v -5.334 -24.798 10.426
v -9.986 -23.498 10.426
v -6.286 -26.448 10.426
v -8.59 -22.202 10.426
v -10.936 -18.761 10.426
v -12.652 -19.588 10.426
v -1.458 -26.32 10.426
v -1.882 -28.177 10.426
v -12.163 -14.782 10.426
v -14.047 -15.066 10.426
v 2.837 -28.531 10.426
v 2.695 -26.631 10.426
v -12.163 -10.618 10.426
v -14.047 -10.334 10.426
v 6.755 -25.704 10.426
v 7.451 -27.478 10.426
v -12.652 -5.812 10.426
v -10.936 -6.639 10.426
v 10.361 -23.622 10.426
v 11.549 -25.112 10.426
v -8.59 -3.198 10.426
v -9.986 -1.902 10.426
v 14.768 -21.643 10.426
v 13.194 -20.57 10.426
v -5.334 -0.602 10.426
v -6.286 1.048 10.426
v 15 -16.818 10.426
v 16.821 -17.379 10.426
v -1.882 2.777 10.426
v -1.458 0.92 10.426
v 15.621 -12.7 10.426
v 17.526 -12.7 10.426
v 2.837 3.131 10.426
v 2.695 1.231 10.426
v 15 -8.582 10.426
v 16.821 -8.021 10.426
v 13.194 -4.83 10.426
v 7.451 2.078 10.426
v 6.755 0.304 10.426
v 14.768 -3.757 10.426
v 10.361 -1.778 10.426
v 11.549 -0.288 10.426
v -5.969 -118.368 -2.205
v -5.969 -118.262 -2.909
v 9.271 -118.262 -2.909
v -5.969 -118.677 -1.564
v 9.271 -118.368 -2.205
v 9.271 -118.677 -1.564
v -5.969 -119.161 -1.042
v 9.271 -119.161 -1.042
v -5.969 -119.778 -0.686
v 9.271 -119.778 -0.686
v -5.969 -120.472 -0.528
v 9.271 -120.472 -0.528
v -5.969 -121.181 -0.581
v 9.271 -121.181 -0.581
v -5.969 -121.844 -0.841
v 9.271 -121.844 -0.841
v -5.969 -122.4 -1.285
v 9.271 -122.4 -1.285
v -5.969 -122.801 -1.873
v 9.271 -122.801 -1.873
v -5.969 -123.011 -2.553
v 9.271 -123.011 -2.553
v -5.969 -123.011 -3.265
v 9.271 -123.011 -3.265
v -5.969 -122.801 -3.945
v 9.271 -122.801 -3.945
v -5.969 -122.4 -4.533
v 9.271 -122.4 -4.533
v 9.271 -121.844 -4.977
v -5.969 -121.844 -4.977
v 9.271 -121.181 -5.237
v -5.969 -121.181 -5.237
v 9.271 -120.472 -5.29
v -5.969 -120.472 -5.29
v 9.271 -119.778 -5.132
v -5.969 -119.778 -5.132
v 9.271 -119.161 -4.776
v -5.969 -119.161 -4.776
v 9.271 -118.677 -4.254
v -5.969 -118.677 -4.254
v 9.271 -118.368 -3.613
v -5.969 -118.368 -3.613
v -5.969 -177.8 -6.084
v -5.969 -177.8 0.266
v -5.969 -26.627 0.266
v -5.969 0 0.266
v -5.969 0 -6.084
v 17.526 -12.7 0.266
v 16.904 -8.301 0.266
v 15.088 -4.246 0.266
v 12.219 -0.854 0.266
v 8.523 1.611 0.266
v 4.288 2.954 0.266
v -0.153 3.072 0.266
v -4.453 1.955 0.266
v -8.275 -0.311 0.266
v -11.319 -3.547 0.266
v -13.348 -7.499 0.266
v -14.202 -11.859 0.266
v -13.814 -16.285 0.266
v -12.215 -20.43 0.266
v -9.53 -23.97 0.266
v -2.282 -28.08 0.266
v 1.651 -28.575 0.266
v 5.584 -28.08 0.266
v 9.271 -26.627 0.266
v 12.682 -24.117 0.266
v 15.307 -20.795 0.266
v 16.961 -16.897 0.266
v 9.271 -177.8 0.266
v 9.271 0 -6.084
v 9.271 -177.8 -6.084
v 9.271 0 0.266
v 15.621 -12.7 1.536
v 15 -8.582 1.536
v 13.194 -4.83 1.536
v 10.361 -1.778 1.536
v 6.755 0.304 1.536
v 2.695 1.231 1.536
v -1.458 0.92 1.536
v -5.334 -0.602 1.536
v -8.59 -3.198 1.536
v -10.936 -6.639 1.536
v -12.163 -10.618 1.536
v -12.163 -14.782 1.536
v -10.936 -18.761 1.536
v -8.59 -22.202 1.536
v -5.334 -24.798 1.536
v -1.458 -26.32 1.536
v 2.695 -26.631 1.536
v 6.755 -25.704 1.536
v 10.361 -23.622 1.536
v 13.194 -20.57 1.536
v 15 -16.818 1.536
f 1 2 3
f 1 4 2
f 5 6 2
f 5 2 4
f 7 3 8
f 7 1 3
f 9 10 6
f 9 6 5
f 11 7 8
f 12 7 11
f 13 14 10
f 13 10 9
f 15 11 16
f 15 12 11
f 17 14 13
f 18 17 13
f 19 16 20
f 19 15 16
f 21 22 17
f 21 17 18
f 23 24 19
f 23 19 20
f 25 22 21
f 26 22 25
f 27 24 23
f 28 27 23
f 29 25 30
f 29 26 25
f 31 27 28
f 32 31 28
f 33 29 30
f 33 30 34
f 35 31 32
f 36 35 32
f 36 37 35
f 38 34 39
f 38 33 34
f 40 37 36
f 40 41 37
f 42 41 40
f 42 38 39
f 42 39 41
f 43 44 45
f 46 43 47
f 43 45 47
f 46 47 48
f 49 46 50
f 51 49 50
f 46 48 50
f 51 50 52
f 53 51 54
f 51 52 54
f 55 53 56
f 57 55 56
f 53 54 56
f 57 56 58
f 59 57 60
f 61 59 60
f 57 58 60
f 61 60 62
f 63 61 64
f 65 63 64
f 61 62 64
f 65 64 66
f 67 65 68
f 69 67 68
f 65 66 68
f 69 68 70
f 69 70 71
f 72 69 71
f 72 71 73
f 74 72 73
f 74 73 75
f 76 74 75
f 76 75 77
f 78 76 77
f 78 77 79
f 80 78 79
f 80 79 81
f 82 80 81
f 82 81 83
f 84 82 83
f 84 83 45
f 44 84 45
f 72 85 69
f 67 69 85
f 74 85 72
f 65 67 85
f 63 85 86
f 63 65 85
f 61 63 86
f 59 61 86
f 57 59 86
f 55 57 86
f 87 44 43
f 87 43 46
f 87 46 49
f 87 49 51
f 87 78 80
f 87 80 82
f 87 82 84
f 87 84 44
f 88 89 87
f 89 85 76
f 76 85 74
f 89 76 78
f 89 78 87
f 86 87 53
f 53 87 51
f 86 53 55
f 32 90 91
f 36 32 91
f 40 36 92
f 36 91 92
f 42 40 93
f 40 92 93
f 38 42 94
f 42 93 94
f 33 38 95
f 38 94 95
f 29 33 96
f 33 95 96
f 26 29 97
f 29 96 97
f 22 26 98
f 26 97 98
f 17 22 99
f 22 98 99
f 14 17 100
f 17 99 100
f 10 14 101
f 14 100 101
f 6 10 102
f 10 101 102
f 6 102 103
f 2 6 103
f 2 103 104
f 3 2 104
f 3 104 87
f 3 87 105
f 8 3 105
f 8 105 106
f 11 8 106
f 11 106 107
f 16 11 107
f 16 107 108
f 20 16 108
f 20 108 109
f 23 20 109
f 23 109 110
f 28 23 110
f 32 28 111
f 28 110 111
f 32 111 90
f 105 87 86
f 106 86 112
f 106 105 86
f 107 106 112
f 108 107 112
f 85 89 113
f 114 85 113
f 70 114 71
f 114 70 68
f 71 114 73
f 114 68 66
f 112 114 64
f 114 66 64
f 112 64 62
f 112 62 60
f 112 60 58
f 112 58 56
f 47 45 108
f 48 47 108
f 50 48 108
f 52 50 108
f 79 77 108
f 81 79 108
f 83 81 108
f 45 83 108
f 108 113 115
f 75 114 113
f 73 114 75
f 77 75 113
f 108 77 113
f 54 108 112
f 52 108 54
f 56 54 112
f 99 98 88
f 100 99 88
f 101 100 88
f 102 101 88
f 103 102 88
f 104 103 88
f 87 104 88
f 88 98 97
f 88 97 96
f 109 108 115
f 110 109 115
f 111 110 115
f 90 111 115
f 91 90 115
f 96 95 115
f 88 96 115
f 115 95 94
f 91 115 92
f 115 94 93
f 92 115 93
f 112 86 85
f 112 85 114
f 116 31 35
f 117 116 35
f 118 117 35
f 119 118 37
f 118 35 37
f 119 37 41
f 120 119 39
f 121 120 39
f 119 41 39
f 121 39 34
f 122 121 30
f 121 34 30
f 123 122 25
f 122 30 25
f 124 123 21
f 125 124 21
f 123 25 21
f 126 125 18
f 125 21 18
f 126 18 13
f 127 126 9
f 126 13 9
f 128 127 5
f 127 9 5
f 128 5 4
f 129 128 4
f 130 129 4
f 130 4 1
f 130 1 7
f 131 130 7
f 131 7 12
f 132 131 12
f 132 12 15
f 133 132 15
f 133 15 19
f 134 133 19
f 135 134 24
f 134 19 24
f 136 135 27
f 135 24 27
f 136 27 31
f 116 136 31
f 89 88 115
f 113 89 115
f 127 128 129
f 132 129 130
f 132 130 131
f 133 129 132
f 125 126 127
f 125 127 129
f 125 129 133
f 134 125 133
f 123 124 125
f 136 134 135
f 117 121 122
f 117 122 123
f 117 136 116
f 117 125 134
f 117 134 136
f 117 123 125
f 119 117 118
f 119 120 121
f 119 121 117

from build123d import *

# Parameters (mm, degrees)
F0_W     = 15.24
F0_H     = 6.35
F1_DEPTH = 177.8
F2_R     = 2.3876
F3_DEPTH = 15.241
F4_R     = 15.875
F5_DEPTH = 10.16
F6_R     = 13.97
F7_DEPTH = 8.89


with BuildPart() as f1:
    # F0 (on Front) → F1 (new body)
    with BuildSketch(Plane.XZ):
        with Locations((1.651002, -2.908992)):
            Rectangle(F0_W, F0_H)
    extrude(amount=F1_DEPTH)

    # F2 (on face) → F3 (cut, through all)
    with BuildSketch(Plane.YZ.offset(9.271002)):
        with Locations((-120.65, -2.908992)):
            Circle(F2_R)
    extrude(amount=-F3_DEPTH, mode=Mode.SUBTRACT)

    # F4 (on face) → F5 (join)
    with BuildSketch(Plane.XY.offset(0.266008)):
        with Locations((1.651002, -12.7)):
            Circle(F4_R)
    extrude(amount=F5_DEPTH)

    # F6 (on face) → F7 (cut)
    with BuildSketch(Plane.XY.offset(10.426008)):
        with Locations((1.651002, -12.7)):
            Circle(F6_R)
    extrude(amount=-F7_DEPTH, mode=Mode.SUBTRACT)


solid = f1.part
